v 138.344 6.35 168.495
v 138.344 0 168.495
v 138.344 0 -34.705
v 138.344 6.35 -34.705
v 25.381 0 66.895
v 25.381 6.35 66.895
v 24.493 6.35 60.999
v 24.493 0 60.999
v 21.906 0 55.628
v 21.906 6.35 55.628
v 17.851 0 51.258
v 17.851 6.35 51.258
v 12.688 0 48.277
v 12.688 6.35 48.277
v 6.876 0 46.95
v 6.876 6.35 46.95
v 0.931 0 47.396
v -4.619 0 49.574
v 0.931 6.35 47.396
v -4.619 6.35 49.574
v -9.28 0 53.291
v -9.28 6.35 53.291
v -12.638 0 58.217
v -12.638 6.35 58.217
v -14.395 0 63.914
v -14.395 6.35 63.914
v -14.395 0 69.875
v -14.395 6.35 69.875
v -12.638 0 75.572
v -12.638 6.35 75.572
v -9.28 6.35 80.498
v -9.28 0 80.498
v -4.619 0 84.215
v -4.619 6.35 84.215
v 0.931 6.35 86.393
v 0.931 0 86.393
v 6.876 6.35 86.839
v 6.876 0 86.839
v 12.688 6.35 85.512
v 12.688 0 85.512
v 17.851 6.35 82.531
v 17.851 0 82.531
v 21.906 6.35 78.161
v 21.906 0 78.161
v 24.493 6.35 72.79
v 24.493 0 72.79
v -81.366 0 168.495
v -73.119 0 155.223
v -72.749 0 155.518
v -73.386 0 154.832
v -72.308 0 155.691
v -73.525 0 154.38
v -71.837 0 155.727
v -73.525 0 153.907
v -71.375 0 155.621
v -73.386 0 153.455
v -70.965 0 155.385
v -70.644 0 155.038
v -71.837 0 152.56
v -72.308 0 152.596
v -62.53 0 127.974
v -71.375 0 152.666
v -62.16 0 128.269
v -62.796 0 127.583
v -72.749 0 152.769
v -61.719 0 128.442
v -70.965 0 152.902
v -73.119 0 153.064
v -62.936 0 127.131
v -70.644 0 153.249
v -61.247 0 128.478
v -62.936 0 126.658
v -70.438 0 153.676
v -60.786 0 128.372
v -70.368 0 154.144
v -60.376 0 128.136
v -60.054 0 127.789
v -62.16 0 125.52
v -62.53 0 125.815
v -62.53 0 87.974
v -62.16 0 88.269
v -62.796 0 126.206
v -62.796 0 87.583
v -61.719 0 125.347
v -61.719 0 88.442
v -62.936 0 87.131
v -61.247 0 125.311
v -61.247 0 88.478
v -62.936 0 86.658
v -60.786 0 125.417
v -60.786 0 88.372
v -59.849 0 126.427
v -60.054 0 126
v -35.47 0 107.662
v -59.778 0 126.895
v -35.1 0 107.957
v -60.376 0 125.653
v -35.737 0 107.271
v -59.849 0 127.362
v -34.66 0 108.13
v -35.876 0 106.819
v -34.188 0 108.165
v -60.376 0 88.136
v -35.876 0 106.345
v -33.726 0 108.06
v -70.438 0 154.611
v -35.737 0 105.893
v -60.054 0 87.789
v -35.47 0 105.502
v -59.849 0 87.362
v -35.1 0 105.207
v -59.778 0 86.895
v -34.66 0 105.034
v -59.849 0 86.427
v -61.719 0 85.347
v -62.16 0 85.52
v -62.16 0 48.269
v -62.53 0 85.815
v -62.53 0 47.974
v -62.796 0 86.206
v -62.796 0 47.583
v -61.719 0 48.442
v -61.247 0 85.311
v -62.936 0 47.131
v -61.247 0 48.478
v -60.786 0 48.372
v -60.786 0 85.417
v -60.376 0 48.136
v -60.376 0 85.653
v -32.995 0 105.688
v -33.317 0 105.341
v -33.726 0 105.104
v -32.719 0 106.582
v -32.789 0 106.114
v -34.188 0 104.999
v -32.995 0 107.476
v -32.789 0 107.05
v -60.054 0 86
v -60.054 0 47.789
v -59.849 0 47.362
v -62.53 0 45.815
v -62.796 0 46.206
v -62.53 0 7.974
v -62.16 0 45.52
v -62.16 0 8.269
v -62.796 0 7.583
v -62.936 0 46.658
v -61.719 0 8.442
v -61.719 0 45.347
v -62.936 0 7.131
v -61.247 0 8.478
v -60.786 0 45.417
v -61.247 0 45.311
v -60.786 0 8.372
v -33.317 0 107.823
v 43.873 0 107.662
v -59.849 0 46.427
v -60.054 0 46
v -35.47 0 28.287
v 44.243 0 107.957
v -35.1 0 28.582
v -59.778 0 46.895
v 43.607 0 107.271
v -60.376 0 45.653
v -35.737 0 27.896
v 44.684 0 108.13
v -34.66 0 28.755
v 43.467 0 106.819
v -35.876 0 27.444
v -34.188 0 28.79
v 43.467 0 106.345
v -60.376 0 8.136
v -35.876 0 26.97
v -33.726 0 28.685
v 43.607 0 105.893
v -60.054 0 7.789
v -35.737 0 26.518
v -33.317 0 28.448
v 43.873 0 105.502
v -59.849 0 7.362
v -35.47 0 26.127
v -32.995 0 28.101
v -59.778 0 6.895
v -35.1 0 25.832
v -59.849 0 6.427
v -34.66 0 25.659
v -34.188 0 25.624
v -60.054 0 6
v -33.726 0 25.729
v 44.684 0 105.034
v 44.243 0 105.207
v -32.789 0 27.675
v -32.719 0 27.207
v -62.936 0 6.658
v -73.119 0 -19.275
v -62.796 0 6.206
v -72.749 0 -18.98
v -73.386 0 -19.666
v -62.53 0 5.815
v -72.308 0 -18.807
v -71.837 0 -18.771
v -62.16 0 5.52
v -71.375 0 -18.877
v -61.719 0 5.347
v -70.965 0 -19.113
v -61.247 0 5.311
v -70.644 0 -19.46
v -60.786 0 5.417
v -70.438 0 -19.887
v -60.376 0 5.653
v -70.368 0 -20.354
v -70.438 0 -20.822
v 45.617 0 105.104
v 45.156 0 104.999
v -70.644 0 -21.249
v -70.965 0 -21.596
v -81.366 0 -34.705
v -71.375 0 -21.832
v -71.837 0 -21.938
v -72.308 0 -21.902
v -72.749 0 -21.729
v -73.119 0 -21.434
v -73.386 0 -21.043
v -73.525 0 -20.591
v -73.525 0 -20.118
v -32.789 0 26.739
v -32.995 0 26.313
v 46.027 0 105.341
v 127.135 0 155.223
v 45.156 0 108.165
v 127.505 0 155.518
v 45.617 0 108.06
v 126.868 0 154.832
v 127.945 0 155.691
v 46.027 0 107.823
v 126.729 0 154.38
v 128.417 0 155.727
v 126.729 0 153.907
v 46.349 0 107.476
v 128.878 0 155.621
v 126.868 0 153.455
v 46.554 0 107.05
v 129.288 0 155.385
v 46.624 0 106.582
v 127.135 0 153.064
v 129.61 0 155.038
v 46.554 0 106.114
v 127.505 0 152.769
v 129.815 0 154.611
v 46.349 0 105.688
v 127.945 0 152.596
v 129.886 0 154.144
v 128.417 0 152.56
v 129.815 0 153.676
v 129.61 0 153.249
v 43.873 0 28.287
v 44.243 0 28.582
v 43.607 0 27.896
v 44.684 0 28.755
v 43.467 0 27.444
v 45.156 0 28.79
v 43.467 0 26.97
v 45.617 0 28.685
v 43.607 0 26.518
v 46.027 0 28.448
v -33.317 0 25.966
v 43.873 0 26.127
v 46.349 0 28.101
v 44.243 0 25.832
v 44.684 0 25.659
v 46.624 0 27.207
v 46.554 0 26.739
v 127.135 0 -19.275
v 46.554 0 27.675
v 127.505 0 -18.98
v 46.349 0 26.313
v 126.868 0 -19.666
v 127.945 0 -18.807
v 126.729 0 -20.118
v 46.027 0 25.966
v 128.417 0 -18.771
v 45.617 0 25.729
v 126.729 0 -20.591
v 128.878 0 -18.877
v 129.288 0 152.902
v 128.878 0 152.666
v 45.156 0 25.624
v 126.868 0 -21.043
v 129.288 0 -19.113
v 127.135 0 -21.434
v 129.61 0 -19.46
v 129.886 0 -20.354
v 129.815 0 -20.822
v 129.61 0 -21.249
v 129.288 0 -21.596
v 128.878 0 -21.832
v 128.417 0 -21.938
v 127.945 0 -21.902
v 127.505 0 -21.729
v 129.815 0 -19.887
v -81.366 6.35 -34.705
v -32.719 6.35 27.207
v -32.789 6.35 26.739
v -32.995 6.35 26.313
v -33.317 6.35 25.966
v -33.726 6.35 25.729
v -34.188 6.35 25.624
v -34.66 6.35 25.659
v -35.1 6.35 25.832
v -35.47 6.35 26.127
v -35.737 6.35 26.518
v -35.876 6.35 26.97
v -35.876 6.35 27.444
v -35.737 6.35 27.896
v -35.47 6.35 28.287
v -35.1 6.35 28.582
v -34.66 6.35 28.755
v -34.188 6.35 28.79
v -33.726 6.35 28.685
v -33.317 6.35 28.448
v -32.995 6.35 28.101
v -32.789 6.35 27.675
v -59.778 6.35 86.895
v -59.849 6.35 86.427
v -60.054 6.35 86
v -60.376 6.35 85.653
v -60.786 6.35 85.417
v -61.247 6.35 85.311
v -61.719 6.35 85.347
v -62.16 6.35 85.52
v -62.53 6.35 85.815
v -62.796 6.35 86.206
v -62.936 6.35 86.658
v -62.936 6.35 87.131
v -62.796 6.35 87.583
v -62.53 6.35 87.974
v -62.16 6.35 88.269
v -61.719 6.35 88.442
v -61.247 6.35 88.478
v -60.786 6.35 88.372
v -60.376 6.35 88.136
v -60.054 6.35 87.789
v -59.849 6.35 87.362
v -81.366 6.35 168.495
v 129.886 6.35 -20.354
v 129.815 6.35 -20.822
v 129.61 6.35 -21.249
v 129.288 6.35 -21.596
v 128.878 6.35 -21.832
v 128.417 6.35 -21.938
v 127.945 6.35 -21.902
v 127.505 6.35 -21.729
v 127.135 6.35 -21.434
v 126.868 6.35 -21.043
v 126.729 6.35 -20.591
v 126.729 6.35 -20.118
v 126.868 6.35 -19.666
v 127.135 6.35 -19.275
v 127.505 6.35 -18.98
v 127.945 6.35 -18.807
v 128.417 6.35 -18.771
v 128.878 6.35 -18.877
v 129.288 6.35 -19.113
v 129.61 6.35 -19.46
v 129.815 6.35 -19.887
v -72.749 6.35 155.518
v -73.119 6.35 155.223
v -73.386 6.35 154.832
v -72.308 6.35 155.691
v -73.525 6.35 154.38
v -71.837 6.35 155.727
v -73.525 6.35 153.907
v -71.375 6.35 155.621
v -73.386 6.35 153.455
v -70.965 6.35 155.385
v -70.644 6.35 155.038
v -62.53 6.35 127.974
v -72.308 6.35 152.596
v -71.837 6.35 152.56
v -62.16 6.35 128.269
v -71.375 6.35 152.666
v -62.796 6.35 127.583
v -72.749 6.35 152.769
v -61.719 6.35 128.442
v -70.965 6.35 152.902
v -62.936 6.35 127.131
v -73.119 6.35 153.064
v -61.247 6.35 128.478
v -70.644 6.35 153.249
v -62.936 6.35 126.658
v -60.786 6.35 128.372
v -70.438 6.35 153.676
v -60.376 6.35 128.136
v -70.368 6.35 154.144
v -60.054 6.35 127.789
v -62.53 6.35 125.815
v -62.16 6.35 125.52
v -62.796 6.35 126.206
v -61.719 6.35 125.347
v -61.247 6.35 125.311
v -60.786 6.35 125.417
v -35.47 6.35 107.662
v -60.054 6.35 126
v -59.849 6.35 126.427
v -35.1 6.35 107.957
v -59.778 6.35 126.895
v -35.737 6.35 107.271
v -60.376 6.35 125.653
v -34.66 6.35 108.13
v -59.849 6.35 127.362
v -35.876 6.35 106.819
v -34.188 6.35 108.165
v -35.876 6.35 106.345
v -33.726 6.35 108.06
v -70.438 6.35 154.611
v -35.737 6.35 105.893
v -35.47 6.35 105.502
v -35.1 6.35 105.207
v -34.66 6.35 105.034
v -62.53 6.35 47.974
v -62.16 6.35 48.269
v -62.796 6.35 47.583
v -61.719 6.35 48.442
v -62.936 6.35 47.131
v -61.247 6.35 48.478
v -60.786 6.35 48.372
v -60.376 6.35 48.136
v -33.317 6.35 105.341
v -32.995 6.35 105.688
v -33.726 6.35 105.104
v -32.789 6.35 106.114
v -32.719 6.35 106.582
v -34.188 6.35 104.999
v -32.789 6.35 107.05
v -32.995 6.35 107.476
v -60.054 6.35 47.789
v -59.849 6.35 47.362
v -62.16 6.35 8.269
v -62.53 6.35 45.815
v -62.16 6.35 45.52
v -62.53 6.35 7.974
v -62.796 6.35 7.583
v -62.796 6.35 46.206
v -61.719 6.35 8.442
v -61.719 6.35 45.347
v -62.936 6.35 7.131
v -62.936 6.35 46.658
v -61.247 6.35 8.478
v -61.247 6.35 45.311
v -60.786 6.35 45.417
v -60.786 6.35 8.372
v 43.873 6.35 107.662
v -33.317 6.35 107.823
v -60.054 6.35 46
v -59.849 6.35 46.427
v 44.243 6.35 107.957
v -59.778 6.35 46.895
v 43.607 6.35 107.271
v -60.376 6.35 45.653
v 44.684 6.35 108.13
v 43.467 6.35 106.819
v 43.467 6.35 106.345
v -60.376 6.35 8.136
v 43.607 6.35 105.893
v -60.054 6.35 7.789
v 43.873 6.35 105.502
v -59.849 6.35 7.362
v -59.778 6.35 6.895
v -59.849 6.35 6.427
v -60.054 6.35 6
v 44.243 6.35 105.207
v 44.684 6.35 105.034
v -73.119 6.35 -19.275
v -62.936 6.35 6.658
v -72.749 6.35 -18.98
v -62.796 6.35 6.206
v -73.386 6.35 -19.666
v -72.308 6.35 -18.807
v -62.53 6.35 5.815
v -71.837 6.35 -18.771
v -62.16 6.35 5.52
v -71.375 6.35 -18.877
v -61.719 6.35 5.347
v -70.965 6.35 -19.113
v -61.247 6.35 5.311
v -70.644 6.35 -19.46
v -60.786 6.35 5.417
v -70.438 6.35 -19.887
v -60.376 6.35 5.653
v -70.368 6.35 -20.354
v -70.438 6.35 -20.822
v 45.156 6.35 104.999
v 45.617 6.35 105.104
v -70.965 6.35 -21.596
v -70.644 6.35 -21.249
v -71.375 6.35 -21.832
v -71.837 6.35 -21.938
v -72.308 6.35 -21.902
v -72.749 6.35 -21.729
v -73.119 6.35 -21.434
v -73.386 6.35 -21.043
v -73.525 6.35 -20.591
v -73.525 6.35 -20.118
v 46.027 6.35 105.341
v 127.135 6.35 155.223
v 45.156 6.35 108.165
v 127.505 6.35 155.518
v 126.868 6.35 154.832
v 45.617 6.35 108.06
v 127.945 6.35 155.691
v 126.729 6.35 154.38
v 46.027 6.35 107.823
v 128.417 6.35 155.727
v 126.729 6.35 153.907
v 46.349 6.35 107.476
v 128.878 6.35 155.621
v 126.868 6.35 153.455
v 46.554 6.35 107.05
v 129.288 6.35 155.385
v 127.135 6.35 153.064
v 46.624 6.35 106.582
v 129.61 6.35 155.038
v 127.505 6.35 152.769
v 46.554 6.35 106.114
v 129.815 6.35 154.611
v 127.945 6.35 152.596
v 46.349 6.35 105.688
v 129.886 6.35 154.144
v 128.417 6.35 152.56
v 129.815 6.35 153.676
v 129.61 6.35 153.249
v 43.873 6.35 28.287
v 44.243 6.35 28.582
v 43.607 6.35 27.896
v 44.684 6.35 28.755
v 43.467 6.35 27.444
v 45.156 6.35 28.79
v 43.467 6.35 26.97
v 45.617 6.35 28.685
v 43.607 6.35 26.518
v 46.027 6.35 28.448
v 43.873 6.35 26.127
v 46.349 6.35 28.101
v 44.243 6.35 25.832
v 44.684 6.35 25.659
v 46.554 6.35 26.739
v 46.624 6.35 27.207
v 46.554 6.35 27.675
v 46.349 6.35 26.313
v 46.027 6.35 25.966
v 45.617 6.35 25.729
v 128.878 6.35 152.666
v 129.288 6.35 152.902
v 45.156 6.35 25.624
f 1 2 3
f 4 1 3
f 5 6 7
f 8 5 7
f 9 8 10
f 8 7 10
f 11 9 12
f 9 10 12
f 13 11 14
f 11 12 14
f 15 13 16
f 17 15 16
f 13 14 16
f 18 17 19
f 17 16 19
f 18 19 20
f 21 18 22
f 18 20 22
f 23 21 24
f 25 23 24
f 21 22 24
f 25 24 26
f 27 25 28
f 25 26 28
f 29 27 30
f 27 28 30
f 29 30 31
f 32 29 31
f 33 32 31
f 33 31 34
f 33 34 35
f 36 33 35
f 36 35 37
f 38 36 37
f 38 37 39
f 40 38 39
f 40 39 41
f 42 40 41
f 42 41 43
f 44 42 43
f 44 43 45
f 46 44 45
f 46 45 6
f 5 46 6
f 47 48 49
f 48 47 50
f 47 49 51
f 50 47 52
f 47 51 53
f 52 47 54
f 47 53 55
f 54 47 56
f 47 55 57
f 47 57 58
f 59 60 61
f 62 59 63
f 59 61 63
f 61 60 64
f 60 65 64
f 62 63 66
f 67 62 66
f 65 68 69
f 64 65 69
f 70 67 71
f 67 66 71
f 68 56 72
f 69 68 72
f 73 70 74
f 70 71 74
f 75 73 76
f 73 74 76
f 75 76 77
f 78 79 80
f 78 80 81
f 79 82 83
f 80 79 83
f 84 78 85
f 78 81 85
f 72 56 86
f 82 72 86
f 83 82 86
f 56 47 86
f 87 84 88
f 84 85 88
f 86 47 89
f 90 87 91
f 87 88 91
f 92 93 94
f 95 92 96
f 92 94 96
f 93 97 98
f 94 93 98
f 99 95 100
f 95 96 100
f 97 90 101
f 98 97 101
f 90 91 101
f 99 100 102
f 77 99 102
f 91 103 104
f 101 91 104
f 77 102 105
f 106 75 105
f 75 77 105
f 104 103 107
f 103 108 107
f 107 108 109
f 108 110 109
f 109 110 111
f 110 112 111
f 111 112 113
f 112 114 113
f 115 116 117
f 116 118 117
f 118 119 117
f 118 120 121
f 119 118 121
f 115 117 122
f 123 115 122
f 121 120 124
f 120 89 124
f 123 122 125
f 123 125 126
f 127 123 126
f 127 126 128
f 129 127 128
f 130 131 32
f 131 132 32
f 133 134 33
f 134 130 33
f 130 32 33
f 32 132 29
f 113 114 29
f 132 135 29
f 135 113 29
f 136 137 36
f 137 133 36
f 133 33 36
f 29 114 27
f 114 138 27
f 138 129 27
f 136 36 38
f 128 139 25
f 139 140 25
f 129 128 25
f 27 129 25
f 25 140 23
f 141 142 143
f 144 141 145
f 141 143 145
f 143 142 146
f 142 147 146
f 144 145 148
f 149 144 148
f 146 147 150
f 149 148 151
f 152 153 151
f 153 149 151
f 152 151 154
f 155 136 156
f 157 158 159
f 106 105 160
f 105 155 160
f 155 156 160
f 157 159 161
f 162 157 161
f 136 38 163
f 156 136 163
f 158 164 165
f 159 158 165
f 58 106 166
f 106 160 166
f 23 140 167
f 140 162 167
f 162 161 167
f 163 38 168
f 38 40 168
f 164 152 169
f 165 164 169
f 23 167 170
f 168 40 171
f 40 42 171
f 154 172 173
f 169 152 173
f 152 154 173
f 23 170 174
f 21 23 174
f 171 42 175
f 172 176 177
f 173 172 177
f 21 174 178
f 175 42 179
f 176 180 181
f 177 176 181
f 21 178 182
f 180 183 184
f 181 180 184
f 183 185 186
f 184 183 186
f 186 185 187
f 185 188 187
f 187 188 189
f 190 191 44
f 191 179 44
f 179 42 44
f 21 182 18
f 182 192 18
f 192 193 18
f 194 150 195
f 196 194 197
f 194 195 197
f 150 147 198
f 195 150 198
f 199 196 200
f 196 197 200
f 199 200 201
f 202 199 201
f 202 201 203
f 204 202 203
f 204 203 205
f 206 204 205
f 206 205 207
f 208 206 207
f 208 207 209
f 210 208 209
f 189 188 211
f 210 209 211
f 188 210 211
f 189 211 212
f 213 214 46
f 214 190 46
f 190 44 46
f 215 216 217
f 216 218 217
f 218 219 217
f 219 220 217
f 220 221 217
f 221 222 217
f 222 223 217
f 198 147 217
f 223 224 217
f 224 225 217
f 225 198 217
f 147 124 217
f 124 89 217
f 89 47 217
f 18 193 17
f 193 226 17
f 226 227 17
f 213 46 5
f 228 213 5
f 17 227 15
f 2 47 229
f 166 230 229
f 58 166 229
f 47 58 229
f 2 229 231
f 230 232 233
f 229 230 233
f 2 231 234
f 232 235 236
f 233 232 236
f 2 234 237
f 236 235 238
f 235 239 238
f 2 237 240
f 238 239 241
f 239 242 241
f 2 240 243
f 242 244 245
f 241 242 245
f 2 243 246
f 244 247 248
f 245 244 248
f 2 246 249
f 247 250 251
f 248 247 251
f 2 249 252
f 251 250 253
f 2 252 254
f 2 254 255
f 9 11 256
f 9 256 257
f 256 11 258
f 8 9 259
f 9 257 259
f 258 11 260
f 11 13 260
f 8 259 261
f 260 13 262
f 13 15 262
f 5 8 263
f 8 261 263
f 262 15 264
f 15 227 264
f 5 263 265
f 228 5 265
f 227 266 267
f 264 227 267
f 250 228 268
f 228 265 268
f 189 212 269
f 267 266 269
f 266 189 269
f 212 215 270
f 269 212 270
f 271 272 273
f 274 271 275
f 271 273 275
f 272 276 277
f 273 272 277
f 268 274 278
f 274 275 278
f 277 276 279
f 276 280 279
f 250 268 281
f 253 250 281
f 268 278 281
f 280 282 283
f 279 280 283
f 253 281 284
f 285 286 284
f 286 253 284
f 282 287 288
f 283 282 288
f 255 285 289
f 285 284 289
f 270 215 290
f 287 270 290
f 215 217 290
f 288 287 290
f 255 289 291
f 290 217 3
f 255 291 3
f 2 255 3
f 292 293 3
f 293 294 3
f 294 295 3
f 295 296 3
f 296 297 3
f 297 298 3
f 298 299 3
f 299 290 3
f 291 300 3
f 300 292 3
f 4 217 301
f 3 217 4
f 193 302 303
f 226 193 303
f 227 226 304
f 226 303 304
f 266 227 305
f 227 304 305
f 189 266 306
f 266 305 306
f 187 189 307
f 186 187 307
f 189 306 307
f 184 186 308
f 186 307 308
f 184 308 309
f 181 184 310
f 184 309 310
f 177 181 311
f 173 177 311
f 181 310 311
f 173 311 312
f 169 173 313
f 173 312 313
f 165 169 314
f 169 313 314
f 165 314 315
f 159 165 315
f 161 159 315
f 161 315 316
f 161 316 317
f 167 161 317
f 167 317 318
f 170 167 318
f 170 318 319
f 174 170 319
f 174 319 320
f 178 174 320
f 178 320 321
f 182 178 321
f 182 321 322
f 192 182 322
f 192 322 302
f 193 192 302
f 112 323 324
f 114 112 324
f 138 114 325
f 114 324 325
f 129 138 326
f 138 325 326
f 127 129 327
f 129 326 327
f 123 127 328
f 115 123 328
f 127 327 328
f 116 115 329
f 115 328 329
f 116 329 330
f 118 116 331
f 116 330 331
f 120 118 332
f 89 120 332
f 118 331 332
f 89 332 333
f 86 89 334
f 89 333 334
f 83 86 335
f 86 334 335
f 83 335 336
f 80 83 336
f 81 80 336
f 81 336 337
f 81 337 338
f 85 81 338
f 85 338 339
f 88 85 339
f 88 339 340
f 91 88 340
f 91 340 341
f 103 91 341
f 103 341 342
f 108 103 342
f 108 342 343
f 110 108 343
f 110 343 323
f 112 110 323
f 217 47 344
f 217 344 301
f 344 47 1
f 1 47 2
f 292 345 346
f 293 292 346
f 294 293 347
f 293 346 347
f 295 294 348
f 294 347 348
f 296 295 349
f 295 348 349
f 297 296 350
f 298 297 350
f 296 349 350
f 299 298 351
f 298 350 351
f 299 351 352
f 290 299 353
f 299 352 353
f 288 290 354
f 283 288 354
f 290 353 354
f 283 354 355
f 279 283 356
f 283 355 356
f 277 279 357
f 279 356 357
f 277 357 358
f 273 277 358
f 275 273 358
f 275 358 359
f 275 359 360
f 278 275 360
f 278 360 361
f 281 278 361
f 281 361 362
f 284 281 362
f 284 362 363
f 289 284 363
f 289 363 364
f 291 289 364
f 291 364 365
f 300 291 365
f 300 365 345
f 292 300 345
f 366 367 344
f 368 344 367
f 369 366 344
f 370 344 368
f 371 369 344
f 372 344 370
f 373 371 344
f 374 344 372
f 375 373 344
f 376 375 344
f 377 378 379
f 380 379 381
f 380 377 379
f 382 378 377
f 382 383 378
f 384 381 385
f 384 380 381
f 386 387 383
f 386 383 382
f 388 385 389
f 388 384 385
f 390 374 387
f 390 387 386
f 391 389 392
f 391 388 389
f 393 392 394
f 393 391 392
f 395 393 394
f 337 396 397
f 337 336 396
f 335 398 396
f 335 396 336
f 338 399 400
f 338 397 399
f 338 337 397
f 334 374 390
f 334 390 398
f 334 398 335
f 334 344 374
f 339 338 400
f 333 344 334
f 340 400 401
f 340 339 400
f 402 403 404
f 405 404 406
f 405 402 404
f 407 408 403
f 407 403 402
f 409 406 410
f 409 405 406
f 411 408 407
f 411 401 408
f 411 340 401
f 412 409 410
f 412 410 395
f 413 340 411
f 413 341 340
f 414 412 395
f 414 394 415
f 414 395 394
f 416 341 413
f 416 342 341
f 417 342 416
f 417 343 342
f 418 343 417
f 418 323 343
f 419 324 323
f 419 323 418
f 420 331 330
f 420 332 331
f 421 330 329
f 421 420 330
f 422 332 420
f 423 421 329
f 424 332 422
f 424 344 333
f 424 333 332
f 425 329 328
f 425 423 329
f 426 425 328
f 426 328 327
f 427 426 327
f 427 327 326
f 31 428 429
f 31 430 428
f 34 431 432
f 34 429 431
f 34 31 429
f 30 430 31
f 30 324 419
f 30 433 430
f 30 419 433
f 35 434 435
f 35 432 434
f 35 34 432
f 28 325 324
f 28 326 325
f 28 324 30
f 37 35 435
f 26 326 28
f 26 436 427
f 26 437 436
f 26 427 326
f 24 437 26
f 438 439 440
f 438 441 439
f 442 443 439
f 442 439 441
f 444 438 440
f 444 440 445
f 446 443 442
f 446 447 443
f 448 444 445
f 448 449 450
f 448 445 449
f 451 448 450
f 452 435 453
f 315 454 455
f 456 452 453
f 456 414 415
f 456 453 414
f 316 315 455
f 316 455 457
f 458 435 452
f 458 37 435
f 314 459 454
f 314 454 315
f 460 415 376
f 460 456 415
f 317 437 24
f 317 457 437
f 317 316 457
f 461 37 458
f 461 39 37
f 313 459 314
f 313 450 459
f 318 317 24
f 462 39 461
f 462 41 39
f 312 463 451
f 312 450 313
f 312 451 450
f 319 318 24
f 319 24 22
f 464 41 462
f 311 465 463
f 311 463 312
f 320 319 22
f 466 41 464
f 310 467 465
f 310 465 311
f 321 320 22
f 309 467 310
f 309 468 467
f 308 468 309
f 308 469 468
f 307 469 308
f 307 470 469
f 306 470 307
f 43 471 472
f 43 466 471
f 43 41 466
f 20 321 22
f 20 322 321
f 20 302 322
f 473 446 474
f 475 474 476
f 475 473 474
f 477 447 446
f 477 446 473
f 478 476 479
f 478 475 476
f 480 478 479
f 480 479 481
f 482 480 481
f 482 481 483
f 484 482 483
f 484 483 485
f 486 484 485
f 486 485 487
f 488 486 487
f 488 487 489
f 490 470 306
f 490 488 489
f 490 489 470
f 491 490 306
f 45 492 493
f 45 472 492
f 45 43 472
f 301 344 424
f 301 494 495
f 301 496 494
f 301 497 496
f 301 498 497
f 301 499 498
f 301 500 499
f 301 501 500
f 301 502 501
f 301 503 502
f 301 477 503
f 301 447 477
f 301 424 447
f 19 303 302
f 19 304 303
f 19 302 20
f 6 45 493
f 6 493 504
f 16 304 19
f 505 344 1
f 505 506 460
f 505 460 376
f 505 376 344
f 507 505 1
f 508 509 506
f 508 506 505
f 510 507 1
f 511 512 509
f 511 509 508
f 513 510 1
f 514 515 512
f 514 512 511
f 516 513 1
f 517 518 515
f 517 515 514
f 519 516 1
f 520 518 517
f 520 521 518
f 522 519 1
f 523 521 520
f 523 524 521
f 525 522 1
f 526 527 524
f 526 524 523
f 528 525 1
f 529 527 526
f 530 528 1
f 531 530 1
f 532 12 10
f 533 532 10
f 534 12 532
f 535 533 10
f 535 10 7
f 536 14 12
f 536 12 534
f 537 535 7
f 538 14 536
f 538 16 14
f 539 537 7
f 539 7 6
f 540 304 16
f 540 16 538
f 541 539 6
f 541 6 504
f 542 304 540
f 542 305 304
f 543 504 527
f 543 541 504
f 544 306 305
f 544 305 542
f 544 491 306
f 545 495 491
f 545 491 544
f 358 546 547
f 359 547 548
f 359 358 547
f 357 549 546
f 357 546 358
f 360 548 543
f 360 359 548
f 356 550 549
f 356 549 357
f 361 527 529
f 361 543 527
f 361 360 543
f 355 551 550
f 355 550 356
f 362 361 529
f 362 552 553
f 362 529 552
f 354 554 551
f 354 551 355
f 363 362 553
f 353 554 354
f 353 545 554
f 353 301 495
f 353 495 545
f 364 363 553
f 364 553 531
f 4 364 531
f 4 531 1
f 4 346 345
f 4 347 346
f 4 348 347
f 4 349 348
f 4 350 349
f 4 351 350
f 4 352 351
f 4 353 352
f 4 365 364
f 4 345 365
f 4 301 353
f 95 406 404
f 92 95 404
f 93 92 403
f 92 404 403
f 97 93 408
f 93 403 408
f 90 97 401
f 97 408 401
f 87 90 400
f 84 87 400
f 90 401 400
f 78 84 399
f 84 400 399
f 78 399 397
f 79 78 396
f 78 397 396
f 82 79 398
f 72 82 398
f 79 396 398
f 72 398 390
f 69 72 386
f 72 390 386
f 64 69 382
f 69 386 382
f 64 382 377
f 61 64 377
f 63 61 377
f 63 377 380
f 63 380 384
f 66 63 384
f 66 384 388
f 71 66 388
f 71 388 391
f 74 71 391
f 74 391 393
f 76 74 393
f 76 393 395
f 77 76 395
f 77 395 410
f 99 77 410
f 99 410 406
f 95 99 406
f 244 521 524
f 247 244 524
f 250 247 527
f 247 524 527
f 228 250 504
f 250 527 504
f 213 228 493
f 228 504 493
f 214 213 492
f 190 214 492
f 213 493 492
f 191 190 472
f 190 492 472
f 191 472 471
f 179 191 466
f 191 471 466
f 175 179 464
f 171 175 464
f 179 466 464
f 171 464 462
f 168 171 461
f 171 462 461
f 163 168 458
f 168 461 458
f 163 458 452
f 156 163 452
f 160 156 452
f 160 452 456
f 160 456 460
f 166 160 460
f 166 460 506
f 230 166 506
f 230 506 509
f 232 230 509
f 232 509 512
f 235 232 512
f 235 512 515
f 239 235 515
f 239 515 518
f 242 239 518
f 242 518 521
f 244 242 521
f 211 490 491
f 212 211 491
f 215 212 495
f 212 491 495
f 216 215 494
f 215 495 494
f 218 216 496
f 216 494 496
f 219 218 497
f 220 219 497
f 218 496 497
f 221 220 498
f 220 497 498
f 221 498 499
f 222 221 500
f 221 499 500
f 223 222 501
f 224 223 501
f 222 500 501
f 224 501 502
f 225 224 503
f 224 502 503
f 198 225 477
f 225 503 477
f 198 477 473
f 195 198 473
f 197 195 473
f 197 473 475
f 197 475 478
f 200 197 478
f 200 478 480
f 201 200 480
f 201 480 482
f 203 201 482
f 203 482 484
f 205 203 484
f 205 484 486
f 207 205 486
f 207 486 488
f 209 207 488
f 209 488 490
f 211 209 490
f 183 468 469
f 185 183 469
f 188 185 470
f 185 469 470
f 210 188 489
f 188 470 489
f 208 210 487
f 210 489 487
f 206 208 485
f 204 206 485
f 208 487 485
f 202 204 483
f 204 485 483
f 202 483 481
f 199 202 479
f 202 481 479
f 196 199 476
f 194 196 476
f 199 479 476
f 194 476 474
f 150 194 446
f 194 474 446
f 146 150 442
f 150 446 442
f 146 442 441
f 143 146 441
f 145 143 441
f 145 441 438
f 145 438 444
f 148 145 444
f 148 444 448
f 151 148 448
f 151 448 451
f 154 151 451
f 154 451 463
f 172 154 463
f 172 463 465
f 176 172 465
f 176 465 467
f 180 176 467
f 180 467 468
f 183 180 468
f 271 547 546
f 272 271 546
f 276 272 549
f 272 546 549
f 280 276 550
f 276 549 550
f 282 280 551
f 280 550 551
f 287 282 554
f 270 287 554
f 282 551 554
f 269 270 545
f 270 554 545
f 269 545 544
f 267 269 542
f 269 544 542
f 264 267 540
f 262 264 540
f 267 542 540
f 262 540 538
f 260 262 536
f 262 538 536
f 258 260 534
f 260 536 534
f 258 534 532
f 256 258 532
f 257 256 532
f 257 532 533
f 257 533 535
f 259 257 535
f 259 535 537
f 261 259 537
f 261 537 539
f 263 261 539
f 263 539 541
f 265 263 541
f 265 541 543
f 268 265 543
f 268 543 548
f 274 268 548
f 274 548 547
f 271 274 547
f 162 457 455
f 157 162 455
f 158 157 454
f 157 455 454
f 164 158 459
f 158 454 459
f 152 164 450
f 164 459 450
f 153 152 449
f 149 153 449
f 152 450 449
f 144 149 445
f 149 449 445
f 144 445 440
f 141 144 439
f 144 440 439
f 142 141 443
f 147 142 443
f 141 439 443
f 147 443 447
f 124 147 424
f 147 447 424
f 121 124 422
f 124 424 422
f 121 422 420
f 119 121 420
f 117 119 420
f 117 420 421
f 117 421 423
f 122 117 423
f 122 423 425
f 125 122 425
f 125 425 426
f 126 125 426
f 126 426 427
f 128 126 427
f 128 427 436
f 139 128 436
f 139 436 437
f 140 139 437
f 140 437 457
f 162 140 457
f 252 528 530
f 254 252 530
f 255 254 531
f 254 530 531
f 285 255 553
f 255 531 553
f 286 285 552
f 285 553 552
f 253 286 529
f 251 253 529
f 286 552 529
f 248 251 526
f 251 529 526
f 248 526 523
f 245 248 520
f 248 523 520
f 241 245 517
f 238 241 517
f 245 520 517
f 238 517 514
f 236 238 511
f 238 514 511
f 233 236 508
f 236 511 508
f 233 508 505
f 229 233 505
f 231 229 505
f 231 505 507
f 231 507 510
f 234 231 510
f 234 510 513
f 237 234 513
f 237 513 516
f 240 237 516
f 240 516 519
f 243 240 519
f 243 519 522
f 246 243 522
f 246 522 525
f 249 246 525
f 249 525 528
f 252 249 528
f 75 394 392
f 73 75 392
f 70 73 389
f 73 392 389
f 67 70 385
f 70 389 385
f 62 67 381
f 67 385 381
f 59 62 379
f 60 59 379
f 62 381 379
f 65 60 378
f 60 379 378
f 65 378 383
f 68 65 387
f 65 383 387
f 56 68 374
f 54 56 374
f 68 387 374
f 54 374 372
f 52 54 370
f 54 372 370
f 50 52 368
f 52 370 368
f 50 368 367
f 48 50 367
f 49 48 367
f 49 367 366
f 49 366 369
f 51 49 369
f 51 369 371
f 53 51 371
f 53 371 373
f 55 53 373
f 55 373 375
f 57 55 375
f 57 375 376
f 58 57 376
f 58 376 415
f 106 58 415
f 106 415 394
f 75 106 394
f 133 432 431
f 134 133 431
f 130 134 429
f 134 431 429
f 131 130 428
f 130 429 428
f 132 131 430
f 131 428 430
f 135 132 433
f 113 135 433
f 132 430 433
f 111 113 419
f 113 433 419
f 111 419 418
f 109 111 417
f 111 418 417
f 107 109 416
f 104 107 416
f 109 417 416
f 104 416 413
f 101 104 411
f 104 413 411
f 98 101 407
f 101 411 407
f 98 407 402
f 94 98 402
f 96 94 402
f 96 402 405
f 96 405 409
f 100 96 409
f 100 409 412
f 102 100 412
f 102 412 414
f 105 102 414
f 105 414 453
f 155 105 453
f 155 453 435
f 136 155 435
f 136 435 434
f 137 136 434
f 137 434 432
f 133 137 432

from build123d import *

# Parameters (mm, degrees)
SKETCH1_W           = 219.71
SKETCH1_H           = 203.2
BOSS_EXTRUDE1_DEPTH = 6.35
SKETCH2_R           = 1.5875
SKETCH2_R_2         = 20.000000005
CUT_EXTRUDE3_DEPTH  = 7.35


with BuildPart() as part:
    # Sketch1 → Boss-Extrude1 (new body)
    with BuildSketch(Plane(origin=(0, 0, 0), x_dir=(1, 0, 0), z_dir=(0, 1, 0))):
        with Locations((28.489079589, -66.894525566)):
            Rectangle(SKETCH1_W, SKETCH1_H)
    extrude(amount=BOSS_EXTRUDE1_DEPTH)

    # Sketch2 → Cut-Extrude3 (cut, through all)
    with BuildSketch(Plane(origin=(0, 6.35, 0), x_dir=(1, 0, 0), z_dir=(0, 1, 0))):
        with Locations((-61.365920533, -46.894525561)):
            Circle(SKETCH2_R)
        with Locations((128.298379589, -154.143525566)):
            Circle(SKETCH2_R)
        with Locations((128.298379589, 20.354474434)):
            Circle(SKETCH2_R)
        with Locations((-71.955220411, 20.354474434)):
            Circle(SKETCH2_R)
        with Locations((-71.955220411, -154.143525566)):
            Circle(SKETCH2_R)
        with Locations((-61.365920533, -6.894525551)):
            Circle(SKETCH2_R)
        with Locations((-61.365920533, -86.894525571)):
            Circle(SKETCH2_R)
        with Locations((-61.365920533, -126.894525327)):
            Circle(SKETCH2_R)
        with Locations((5.381145499, -66.894525566)):
            Circle(SKETCH2_R_2)
        with Locations((45.036895499, -106.582025566)):
            Circle(SKETCH2_R)
        with Locations((-34.306354501, -106.582025566)):
            Circle(SKETCH2_R)
        with Locations((-34.306354501, -27.207025566)):
            Circle(SKETCH2_R)
        with Locations((45.036895499, -27.207025566)):
            Circle(SKETCH2_R)
    extrude(amount=-CUT_EXTRUDE3_DEPTH, mode=Mode.SUBTRACT)


solid = part.part
